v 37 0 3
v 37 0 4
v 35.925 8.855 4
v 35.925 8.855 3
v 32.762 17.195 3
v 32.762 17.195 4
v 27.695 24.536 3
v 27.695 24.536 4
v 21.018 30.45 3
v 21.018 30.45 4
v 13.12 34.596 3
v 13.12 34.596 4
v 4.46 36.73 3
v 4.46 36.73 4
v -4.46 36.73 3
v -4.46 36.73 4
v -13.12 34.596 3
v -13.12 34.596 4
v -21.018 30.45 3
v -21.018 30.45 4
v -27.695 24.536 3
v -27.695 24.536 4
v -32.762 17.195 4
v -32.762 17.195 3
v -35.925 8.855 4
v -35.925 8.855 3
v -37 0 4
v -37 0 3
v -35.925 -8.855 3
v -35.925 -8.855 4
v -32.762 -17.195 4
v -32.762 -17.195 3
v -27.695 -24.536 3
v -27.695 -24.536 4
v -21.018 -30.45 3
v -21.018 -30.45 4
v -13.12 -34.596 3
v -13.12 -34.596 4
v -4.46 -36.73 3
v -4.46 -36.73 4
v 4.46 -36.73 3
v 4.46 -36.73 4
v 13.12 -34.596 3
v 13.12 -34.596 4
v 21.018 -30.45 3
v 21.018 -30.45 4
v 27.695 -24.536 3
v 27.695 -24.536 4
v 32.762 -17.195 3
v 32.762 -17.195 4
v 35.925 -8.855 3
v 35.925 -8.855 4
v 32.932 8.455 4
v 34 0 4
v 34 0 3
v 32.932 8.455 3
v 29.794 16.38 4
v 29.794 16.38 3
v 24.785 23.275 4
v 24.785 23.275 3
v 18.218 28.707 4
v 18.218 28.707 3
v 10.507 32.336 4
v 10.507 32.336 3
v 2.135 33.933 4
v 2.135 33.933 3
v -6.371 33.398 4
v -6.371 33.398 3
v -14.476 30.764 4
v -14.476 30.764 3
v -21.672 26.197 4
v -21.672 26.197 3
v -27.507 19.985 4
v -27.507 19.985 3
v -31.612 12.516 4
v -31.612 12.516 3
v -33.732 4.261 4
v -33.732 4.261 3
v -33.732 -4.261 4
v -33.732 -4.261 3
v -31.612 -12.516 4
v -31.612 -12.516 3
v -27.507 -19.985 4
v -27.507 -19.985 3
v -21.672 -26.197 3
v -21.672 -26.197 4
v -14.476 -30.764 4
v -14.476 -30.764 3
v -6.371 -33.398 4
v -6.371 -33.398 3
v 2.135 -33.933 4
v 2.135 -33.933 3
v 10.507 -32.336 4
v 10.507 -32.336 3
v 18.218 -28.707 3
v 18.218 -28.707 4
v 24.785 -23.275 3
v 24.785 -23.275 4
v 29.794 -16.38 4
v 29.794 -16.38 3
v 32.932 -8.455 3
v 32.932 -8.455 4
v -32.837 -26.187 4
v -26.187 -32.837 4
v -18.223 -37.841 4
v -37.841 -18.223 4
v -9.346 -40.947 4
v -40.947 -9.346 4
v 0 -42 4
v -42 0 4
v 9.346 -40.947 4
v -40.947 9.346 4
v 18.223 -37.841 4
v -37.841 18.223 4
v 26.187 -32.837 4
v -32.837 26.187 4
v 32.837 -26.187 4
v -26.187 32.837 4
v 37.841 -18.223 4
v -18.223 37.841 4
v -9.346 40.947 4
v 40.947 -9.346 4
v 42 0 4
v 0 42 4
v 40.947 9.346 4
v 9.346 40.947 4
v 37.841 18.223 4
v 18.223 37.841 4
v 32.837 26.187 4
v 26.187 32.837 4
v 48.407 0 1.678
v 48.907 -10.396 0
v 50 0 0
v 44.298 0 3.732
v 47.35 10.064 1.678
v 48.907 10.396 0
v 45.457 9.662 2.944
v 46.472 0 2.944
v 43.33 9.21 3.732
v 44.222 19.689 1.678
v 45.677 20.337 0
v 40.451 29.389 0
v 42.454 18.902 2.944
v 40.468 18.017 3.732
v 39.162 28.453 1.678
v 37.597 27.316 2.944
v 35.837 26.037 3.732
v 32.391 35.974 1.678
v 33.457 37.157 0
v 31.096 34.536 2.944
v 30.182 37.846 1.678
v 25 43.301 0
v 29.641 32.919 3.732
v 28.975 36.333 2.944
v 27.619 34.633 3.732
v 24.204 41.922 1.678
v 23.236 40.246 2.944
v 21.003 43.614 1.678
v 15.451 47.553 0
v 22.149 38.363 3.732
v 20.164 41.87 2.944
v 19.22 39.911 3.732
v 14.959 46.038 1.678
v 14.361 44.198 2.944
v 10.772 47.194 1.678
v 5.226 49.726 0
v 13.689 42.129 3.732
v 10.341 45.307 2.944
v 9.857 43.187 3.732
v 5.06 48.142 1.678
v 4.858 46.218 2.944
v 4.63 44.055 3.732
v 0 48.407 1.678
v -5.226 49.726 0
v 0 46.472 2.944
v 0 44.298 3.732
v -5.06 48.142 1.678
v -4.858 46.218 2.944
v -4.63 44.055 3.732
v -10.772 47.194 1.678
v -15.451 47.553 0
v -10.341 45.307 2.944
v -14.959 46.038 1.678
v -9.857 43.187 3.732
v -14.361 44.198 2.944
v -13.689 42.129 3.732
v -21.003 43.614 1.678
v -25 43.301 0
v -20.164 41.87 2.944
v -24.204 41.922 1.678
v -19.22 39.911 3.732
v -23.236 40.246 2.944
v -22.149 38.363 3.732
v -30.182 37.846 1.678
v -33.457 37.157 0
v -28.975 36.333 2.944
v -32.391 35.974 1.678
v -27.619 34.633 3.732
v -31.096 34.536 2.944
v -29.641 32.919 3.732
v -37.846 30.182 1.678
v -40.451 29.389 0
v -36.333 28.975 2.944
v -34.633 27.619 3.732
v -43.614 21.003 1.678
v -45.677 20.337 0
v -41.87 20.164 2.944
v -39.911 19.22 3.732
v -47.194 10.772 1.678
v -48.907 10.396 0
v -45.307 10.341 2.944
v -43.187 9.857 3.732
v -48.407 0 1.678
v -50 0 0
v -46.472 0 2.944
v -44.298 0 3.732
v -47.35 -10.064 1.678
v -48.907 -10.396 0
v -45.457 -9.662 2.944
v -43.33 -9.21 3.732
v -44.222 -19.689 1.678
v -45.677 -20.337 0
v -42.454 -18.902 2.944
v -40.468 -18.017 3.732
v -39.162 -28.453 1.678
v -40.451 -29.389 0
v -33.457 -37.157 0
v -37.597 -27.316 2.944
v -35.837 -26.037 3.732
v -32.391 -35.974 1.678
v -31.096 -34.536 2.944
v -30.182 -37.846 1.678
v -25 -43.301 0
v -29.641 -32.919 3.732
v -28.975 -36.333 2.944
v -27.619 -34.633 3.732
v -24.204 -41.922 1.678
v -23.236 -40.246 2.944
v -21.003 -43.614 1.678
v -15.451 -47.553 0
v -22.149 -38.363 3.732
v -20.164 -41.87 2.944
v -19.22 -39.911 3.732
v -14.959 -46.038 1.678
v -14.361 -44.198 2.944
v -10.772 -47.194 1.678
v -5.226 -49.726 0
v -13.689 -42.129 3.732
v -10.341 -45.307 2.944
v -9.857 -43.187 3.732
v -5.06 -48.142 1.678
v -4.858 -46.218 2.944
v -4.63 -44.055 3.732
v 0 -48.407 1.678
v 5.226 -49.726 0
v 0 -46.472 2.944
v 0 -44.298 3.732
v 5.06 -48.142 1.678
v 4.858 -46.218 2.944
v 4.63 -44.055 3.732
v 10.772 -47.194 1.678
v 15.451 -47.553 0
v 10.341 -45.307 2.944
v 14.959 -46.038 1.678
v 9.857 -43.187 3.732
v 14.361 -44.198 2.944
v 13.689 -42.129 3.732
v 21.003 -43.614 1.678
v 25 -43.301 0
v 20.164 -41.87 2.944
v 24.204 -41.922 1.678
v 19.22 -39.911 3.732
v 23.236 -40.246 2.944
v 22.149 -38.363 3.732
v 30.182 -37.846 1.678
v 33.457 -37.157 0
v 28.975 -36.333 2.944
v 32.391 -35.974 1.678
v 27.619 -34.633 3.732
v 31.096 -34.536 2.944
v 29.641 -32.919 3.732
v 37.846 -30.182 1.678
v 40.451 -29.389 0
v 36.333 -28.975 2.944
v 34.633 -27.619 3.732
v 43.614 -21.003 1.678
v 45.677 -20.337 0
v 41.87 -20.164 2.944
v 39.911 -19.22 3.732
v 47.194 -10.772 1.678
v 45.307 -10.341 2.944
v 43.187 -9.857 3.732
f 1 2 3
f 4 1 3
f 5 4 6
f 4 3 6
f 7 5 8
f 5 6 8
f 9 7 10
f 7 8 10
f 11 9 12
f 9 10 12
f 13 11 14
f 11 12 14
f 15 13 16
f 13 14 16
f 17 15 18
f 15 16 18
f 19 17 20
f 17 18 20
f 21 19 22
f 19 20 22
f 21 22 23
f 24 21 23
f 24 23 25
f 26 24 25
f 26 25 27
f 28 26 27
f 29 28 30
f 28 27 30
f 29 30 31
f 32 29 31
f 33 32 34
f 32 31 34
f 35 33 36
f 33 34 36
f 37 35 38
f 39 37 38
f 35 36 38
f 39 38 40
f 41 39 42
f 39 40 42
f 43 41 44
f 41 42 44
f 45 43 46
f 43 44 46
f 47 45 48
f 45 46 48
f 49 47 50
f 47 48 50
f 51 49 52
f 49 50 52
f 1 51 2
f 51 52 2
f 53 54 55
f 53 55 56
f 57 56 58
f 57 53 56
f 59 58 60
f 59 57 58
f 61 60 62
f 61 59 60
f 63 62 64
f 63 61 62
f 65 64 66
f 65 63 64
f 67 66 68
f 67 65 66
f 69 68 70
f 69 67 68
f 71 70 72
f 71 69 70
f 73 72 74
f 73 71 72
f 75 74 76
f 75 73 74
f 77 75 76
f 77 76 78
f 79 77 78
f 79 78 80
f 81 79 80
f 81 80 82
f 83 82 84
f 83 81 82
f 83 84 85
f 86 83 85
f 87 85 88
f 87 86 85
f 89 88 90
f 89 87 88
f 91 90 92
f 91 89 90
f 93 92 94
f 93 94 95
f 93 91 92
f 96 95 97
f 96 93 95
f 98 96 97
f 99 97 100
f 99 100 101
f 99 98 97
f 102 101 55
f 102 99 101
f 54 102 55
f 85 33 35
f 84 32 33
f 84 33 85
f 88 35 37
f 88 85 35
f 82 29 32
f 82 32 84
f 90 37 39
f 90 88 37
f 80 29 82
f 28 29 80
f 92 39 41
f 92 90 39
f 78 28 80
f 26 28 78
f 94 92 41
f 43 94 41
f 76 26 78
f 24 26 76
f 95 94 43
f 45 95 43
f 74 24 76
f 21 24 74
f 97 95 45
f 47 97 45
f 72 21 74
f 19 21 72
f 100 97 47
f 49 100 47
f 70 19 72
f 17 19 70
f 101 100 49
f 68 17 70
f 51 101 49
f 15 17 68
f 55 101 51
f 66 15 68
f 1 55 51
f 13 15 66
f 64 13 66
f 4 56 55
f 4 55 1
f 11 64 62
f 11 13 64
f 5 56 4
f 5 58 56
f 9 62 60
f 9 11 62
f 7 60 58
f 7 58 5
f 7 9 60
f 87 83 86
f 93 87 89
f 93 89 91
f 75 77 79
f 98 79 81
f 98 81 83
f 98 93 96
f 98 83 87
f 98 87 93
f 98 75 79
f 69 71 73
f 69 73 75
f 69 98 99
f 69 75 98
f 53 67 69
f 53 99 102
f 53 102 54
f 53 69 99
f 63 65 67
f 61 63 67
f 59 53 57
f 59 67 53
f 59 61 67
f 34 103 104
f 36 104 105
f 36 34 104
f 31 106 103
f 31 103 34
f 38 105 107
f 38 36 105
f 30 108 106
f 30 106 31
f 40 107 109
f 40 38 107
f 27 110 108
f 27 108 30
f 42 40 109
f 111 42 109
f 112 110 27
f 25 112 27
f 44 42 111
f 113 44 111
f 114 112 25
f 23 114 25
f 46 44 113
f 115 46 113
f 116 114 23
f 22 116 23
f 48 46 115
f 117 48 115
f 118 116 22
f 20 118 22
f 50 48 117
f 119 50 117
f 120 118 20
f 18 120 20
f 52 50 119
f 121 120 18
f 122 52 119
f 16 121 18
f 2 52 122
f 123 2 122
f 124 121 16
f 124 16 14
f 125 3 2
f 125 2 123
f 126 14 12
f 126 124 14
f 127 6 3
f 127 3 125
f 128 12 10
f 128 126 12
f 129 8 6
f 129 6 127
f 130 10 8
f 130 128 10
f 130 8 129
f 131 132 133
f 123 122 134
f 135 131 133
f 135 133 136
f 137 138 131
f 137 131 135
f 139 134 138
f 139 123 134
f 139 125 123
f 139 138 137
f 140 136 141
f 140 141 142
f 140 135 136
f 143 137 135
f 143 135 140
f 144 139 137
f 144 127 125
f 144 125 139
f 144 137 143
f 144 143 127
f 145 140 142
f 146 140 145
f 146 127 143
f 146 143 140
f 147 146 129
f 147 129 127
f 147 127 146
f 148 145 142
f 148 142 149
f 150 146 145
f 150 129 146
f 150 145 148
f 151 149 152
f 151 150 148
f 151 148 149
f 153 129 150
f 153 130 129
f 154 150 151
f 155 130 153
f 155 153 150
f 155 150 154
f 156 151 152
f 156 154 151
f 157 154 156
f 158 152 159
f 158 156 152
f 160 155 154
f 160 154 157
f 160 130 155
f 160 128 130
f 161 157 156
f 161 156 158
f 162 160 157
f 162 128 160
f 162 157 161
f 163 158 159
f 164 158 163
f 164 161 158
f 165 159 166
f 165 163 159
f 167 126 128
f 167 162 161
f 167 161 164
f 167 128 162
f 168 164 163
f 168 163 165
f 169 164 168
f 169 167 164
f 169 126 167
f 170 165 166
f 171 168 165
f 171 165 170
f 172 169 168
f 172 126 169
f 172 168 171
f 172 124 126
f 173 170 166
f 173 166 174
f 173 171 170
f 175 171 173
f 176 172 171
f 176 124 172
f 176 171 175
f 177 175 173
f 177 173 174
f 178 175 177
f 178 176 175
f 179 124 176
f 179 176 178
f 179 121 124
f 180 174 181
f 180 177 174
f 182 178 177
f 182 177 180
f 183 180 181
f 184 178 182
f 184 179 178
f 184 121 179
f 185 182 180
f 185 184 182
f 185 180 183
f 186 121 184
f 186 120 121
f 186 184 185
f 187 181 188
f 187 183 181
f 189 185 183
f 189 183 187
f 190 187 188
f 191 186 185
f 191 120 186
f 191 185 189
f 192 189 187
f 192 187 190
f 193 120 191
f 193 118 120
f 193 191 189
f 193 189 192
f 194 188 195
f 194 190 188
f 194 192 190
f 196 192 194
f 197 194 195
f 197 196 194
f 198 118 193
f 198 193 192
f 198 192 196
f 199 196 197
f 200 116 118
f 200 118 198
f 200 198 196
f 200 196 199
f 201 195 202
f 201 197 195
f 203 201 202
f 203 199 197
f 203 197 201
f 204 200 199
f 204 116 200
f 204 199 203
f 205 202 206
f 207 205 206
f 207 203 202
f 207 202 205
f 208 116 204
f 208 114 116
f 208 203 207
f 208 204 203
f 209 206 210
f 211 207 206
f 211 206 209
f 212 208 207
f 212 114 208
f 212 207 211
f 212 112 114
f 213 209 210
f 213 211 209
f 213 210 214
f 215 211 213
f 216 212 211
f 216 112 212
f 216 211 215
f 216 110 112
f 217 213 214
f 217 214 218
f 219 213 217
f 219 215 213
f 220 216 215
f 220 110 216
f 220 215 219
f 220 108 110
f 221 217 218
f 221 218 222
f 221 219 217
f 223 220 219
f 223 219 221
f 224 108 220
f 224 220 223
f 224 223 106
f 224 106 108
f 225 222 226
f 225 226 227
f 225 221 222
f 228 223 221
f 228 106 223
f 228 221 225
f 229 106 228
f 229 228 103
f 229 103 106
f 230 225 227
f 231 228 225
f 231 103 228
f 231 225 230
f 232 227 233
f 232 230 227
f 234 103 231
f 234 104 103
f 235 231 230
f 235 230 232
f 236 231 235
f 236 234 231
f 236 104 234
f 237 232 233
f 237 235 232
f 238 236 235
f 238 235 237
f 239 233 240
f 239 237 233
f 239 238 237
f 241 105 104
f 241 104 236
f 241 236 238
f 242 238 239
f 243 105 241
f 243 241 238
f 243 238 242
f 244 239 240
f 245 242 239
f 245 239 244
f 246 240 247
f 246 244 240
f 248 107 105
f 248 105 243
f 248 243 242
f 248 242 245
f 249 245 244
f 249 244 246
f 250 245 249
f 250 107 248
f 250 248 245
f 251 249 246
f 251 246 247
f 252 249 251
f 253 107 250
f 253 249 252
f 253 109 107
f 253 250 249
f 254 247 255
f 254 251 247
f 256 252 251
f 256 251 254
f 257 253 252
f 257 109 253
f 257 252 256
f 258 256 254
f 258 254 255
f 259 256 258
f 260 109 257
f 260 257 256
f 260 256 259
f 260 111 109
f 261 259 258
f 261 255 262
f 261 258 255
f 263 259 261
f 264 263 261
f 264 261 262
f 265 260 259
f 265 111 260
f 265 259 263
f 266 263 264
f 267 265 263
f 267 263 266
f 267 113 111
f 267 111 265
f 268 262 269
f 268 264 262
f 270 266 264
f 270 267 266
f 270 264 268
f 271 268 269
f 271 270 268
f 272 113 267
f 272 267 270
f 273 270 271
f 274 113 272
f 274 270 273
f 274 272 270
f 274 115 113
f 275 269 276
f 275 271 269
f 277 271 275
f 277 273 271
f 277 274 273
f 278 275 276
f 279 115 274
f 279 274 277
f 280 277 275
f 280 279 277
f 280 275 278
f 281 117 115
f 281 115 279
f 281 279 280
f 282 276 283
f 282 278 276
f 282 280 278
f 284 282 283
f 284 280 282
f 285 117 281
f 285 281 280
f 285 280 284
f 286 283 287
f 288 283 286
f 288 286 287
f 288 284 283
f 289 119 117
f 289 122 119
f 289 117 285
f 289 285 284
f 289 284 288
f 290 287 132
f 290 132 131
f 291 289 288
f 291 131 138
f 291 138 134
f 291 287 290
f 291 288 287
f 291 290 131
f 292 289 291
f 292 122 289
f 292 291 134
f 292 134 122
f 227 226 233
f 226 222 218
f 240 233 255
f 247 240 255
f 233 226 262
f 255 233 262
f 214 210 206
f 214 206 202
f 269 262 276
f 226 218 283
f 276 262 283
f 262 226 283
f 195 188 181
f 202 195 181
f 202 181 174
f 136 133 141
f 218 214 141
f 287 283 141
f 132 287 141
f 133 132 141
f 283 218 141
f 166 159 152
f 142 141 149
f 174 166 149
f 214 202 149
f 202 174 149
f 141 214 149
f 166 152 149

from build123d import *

# Parameters (mm, degrees)
F0_R     = 50
F1_DEPTH = 4
F3_R     = 37
F3_R_2   = 34
F4_DEPTH = 1


# Not quite as in the source:
# - a fillet or chamfer that OpenCascade refuses, or shapes differently, is made with other operations: its cross-section is extruded or revolved along the edge and cut away or added


with BuildPart() as f1:
    # F0 (on Top) → F1 (new body)
    with BuildSketch(Plane.XY):
        Circle(F0_R)
    extrude(amount=F1_DEPTH)

    # F2: fillet of radius 10 on 1 edges, made by hand

    # F2_s1 → F2_t2 (revolve, cut)
    with BuildSketch(Plane.XZ):
        with BuildLine():
            ThreePointArc((50, 0), (46.472135955, 2.94427191), (42, 4))
            Line((42, 4), (50, 4))
            Line((50, 4), (50, 0))
        make_face()
    revolve(axis=Axis((0, 0, 4), (0, 0, 1)), mode=Mode.SUBTRACT)

    # F3 (on face) → F4 (cut)
    with BuildSketch(Plane.XY.offset(4)):
        Circle(F3_R)
        Circle(F3_R_2, mode=Mode.SUBTRACT)
    extrude(amount=-F4_DEPTH, mode=Mode.SUBTRACT)


solid = f1.part
